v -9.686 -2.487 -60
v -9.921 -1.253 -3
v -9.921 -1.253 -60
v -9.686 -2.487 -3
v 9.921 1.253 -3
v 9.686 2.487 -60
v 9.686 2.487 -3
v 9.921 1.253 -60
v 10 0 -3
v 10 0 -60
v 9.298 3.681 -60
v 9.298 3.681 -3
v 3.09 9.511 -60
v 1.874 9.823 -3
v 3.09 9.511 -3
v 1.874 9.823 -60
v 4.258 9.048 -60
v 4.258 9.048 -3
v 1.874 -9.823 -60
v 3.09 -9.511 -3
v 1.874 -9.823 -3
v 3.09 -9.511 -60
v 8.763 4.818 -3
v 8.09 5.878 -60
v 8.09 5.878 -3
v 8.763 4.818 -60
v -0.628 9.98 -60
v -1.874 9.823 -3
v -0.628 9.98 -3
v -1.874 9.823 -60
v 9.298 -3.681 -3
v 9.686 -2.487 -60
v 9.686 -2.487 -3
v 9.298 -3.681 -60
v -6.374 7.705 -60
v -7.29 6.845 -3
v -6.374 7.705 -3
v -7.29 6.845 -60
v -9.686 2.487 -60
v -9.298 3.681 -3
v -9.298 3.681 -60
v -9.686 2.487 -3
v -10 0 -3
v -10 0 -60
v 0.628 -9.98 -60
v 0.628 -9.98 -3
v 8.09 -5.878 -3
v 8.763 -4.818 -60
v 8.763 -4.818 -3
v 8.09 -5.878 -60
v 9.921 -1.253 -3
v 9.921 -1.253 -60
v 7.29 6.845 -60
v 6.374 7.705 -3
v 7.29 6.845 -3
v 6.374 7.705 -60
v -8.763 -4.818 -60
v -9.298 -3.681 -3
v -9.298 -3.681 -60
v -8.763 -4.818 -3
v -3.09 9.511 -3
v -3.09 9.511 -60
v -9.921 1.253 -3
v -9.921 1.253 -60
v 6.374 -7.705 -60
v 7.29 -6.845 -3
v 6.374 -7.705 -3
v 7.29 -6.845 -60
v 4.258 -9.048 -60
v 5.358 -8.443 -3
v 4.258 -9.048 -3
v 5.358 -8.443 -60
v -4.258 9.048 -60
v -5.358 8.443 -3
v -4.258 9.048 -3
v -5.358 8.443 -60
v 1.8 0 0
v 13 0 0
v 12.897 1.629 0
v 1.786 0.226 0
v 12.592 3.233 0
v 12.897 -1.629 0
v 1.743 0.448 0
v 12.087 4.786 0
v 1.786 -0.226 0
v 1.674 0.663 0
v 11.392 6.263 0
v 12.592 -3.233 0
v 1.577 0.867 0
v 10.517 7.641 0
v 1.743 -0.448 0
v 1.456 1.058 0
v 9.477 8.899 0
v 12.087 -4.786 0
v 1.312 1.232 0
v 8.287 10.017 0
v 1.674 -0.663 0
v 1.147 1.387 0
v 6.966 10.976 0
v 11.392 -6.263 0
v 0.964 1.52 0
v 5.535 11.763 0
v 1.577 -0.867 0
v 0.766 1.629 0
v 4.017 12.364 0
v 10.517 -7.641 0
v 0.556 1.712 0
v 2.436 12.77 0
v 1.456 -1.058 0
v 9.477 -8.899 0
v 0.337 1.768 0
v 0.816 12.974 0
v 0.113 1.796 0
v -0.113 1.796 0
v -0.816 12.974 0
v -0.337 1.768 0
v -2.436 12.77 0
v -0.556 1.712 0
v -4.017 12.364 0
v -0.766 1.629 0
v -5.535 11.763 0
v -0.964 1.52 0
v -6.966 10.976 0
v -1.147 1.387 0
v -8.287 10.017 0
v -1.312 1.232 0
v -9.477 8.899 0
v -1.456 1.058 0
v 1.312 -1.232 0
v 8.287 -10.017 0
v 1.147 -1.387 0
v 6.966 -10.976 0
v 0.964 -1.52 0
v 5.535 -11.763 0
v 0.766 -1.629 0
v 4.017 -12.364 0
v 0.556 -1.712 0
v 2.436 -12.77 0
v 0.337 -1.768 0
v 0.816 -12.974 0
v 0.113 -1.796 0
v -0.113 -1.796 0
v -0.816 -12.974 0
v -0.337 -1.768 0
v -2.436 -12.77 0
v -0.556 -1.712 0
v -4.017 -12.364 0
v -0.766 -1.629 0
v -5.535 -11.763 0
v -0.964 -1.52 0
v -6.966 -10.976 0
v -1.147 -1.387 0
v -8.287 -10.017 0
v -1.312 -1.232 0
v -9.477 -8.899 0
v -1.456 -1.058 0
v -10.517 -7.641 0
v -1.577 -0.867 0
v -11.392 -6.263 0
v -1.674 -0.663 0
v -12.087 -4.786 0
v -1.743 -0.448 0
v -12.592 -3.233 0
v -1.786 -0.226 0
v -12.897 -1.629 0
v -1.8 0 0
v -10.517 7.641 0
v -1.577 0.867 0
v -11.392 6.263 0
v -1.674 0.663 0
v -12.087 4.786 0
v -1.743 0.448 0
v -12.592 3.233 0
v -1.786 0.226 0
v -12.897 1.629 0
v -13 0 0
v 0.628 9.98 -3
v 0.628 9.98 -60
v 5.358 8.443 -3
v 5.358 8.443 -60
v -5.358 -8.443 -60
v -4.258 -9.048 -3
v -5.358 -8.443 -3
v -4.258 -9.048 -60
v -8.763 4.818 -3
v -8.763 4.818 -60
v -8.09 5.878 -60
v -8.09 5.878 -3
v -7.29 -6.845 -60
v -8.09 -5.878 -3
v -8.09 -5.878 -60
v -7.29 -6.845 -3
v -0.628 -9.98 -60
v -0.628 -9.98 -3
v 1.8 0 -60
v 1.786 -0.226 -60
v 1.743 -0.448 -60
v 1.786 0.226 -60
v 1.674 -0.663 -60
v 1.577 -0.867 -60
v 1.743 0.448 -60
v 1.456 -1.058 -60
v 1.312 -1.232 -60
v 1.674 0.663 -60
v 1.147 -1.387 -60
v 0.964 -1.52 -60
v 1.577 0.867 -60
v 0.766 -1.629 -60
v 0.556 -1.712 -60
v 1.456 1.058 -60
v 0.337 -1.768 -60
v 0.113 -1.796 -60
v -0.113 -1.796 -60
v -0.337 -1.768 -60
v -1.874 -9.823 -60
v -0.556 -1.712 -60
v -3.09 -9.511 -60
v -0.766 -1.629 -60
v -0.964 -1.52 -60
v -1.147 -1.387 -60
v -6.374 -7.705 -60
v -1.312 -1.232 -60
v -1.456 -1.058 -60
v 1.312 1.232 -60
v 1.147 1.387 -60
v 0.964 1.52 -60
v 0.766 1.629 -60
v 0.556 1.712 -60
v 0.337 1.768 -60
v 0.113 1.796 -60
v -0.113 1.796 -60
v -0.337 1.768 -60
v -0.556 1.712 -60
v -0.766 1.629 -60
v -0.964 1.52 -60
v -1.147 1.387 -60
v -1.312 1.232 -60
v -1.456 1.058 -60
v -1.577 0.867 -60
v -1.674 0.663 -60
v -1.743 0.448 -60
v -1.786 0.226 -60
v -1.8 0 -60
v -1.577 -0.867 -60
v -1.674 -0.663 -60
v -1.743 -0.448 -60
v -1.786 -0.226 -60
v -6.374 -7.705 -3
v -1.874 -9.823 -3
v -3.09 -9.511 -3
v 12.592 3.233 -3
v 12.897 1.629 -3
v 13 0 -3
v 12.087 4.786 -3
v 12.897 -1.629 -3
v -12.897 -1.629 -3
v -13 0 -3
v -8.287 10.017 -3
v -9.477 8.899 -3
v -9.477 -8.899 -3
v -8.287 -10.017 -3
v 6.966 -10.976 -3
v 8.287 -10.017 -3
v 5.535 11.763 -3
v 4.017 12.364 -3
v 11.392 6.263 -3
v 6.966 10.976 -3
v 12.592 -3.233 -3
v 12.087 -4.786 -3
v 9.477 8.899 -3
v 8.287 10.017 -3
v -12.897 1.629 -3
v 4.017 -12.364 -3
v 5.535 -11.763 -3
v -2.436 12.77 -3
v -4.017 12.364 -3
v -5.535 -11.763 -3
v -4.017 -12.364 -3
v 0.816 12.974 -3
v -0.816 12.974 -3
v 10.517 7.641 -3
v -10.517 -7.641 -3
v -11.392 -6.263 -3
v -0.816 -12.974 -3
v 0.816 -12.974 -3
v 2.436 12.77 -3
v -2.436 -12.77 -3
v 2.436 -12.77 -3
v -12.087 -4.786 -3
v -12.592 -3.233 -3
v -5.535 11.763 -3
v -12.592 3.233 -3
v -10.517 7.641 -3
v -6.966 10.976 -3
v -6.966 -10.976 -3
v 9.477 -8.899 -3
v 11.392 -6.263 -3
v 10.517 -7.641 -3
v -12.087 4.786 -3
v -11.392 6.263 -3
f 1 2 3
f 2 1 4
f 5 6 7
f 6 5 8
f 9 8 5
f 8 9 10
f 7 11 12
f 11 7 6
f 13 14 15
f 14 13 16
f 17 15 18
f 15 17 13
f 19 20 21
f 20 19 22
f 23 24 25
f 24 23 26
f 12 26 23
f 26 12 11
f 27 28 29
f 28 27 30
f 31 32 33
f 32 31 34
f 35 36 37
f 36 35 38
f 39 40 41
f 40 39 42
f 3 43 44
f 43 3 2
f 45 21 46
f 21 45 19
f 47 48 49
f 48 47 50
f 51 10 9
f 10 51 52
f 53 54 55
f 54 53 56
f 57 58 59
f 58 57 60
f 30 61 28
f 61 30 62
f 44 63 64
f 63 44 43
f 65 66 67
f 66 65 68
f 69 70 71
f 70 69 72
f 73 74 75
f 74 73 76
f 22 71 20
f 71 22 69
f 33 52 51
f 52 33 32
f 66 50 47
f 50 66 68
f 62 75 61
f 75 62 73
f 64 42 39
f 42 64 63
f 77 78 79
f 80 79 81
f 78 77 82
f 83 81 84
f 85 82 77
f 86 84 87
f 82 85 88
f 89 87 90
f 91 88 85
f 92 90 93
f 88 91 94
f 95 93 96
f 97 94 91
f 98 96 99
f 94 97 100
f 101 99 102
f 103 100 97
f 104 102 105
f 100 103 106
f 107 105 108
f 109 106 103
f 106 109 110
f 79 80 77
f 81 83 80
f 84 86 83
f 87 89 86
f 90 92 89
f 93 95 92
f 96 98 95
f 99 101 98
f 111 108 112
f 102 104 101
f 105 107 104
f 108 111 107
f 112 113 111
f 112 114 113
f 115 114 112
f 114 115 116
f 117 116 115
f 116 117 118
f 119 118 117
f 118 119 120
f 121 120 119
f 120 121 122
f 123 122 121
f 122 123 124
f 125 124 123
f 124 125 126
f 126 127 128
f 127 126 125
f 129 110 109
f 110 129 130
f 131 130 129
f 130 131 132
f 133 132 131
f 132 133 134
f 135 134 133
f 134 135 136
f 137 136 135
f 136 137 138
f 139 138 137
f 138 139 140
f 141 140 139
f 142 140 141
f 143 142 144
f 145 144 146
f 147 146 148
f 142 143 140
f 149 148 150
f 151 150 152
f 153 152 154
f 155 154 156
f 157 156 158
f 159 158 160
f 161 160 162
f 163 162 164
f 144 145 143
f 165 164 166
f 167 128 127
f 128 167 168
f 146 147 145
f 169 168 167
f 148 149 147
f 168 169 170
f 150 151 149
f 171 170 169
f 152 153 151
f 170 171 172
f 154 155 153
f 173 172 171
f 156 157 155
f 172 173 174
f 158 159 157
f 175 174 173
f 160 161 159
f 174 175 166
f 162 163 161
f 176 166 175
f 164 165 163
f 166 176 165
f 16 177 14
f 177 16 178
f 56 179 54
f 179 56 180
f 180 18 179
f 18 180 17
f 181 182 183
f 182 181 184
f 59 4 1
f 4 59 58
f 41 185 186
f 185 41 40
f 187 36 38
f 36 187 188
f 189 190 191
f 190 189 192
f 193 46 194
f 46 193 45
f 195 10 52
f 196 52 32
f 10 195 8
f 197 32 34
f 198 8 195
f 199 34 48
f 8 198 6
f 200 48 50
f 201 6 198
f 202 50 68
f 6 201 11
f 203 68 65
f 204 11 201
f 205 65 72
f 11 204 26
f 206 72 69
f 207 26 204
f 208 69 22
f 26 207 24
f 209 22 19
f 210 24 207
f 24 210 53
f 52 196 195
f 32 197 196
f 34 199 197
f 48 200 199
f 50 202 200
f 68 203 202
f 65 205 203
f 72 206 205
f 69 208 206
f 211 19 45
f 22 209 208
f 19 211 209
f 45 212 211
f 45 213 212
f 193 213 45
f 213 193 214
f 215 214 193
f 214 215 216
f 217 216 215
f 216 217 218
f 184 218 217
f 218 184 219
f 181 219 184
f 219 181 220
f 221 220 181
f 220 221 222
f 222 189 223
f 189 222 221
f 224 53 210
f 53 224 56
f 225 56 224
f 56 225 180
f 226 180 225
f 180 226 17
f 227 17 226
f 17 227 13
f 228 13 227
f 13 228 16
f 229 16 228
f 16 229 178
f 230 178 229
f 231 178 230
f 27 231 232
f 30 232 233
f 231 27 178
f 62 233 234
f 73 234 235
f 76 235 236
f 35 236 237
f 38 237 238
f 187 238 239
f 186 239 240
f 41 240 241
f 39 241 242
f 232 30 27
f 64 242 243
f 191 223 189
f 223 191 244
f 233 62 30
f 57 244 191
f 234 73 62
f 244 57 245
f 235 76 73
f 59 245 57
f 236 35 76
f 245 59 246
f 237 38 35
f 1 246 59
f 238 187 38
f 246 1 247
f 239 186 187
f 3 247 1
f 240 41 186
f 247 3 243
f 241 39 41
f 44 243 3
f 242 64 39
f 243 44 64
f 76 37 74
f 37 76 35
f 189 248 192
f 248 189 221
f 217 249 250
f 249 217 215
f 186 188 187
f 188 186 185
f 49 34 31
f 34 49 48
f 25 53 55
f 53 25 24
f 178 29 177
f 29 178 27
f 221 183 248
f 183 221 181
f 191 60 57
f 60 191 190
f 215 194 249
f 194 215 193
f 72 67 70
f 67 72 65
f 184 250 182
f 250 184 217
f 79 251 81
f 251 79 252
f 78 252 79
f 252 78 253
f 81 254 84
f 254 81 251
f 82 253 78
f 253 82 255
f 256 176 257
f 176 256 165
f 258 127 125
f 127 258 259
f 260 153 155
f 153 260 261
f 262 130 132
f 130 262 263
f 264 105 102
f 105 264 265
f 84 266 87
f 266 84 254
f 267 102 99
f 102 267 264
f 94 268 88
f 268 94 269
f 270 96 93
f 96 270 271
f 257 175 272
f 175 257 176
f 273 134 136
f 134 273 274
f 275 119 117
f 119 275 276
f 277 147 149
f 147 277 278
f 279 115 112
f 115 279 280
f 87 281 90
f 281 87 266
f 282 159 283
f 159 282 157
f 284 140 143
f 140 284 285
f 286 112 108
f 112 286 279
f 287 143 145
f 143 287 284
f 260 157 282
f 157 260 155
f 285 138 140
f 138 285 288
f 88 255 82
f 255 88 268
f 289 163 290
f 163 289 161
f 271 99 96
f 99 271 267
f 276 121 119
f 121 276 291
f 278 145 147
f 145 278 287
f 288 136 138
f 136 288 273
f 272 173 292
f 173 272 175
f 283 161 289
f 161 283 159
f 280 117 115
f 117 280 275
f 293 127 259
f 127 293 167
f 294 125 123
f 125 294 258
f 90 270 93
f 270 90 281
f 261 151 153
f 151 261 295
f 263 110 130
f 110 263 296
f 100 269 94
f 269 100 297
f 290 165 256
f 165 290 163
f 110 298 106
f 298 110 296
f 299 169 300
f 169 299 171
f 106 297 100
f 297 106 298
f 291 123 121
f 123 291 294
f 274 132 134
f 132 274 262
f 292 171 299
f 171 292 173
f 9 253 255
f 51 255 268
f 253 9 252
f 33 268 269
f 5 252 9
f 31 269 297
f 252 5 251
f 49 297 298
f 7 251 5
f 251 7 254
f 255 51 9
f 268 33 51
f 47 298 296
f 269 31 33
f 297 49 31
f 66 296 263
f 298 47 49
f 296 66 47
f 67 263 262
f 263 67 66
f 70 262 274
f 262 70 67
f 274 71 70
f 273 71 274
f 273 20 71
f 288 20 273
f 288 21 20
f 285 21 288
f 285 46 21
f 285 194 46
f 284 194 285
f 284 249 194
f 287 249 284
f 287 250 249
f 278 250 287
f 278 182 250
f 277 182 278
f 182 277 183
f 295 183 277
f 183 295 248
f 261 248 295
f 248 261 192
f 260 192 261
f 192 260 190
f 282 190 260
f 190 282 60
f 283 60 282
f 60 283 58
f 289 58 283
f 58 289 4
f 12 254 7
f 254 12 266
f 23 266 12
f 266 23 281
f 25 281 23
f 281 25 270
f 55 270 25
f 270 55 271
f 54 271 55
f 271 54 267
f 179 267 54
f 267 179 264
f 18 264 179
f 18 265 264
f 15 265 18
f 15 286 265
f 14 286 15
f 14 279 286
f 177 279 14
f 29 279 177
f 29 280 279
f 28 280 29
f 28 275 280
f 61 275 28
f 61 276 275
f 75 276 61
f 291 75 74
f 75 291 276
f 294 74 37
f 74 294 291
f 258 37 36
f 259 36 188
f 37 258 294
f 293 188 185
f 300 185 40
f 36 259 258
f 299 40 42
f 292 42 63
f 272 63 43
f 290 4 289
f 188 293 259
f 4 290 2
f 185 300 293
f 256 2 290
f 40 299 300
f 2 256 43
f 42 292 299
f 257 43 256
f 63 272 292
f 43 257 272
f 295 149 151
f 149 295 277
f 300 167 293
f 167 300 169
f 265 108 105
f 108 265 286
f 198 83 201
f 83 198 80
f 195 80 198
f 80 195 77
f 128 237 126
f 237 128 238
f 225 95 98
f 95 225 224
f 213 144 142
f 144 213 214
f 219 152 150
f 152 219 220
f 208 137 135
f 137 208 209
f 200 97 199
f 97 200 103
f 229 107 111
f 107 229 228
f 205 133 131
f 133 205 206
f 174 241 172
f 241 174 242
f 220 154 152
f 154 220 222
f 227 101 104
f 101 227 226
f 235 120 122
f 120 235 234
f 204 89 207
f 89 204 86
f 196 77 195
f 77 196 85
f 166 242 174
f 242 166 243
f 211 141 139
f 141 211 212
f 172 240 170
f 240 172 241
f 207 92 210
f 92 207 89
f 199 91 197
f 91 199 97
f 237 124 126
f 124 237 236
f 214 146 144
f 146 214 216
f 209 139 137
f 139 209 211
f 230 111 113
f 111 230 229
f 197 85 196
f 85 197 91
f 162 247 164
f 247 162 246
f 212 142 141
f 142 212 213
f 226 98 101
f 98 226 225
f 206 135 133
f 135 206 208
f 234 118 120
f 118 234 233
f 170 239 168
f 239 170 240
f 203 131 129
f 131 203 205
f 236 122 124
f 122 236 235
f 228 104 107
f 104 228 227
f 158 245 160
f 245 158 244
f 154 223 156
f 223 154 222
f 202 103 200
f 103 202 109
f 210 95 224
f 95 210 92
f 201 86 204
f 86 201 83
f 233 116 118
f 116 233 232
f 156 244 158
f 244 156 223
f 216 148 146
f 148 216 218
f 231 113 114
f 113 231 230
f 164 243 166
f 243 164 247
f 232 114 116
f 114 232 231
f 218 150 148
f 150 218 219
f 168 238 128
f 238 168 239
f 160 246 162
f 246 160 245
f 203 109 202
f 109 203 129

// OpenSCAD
$fn = 50;


difference() {
	union() {
		translate(v = [0, 0, -60.0000000000]) {
			cylinder(h = 60, r = 10.0000000000);
		}
		translate(v = [0, 0, -3.0000000000]) {
			cylinder(h = 3, r = 13.0000000000);
		}
	}
	union() {
		#translate(v = [0, 0, -60]) {
			cylinder(h = 60, r = 1.8000000000);
		}
	}
}
